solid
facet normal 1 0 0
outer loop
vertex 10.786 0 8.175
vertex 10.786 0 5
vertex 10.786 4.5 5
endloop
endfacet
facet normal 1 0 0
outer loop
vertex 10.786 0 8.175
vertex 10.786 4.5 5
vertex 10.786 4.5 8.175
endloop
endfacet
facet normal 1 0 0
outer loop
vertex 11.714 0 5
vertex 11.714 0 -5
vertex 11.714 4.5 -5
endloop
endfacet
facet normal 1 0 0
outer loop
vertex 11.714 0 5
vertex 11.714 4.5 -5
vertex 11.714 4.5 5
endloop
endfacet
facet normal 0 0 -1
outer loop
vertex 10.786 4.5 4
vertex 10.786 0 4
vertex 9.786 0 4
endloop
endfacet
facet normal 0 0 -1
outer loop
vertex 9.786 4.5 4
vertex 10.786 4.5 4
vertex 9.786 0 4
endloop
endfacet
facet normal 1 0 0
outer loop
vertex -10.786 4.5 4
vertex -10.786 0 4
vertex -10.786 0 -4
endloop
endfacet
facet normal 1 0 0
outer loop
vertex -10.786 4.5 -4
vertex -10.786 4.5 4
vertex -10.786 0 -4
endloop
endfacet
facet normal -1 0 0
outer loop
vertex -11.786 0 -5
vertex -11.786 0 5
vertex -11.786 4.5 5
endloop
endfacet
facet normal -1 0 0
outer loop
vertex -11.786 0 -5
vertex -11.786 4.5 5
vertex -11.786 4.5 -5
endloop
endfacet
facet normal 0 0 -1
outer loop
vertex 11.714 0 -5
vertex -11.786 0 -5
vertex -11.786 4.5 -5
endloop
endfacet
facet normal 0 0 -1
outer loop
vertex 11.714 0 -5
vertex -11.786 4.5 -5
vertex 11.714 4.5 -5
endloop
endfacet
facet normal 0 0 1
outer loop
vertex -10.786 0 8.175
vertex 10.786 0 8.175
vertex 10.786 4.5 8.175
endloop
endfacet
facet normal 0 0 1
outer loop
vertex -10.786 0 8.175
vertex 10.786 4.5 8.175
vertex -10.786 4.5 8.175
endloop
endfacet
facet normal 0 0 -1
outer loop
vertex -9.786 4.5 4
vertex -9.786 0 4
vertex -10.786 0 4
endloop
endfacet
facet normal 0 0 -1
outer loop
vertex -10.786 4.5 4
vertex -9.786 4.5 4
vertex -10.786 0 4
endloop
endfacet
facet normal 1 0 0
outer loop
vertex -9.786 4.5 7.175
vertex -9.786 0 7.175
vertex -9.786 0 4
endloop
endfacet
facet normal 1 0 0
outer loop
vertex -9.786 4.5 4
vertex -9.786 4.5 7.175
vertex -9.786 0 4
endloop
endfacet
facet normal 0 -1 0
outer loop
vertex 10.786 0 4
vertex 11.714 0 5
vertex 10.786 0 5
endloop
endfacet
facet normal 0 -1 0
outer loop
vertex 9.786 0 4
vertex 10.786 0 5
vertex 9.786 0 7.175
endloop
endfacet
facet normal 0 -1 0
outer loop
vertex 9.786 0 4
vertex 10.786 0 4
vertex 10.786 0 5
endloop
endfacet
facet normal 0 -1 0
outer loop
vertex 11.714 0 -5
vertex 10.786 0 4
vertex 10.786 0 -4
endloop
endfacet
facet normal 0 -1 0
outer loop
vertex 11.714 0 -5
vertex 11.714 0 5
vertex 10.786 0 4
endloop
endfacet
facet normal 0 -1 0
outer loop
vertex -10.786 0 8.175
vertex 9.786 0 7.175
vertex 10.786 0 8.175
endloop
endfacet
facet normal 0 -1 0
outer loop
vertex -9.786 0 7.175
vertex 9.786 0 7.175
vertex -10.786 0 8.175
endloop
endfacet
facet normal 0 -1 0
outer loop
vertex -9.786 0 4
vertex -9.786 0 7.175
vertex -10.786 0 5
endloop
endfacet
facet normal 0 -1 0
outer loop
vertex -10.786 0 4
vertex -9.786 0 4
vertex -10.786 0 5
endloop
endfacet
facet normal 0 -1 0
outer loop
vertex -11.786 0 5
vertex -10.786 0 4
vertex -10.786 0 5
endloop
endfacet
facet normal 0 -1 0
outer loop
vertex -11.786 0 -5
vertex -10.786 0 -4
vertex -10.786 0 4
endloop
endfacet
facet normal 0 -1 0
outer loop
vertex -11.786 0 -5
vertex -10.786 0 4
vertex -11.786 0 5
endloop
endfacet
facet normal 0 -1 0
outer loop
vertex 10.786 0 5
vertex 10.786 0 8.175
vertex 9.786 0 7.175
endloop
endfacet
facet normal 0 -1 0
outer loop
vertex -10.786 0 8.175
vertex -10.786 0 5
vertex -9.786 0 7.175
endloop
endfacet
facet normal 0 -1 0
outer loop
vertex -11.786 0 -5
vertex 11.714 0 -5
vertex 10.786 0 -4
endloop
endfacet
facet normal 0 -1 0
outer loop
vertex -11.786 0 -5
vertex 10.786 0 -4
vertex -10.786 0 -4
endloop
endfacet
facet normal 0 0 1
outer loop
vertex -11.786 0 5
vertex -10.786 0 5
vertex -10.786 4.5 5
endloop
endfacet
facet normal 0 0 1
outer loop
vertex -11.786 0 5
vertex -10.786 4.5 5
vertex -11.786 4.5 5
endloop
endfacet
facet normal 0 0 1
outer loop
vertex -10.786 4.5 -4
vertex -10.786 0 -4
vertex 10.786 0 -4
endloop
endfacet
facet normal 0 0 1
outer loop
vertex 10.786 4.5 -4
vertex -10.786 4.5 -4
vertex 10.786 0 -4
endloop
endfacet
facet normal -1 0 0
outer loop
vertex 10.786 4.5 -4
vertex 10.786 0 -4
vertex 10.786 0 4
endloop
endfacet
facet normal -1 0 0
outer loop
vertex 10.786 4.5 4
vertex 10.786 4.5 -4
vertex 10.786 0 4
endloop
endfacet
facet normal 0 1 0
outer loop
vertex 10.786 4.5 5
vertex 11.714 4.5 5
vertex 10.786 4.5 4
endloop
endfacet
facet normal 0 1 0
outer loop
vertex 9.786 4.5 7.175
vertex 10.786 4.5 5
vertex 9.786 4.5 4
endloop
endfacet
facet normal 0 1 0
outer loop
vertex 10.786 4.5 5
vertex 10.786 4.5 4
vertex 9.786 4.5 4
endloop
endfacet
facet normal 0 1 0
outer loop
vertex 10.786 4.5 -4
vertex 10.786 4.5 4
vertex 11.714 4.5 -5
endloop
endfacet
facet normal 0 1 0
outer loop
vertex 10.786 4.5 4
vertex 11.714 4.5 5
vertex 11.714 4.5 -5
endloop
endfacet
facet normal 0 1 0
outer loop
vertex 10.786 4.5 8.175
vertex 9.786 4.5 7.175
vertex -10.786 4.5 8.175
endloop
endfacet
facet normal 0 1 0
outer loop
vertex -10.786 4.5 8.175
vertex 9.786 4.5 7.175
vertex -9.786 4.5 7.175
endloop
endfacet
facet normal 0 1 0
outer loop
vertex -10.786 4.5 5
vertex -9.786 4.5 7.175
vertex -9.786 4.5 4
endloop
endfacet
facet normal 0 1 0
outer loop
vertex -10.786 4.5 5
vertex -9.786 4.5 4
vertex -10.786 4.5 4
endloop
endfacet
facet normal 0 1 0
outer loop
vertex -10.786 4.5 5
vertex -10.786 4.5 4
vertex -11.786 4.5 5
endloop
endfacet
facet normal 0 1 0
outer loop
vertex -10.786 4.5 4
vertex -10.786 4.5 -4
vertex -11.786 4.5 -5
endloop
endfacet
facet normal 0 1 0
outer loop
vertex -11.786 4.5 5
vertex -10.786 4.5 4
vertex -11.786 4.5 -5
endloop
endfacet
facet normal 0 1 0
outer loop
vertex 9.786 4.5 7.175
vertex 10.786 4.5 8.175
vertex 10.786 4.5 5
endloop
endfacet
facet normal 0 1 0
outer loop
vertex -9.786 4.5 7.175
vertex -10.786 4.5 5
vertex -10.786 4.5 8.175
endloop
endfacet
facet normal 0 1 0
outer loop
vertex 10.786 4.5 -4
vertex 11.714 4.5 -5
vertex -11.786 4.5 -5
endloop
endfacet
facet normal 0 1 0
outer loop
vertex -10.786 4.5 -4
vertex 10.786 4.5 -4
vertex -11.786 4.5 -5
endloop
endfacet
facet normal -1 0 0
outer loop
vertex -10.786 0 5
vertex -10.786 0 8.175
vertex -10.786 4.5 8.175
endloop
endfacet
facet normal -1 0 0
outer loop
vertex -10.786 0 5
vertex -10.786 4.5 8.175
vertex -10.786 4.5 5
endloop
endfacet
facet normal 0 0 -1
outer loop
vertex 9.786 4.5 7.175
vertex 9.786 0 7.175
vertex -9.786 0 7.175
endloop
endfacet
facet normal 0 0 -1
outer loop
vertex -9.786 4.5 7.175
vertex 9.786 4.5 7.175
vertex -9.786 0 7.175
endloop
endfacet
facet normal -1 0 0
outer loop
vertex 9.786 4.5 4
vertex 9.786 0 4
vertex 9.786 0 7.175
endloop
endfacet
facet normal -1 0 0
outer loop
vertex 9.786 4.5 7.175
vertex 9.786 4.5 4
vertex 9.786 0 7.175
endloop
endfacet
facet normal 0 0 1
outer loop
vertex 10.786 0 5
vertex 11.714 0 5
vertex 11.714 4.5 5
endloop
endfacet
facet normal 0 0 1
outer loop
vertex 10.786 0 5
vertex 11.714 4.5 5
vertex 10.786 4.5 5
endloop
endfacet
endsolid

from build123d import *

# Parameters (mm, degrees)
BOSS_EXTRUDE1_DEPTH = 4.5


with BuildPart() as part:
    # Sketch1 → Boss-Extrude1 (new body)
    with BuildSketch(Plane(origin=(0, 0, 0), x_dir=(1, 0, 0), z_dir=(0, 1, 0))):
        Polygon((11.714410298, 5), (11.714410298, -5), (10.785589702, -5), (10.785589702, -8.175), (-10.785589702, -8.175), (-10.785589702, -5), (-11.785589702, -5), (-11.785589702, 5), align=None)
        Polygon((10.785589702, 4), (10.785589702, -4), (9.785589702, -4), (9.785589702, -7.175), (-9.785589702, -7.175), (-9.785589702, -4), (-10.785589702, -4), (-10.785589702, 4), align=None, mode=Mode.SUBTRACT)
    extrude(amount=BOSS_EXTRUDE1_DEPTH)


solid = part.part
